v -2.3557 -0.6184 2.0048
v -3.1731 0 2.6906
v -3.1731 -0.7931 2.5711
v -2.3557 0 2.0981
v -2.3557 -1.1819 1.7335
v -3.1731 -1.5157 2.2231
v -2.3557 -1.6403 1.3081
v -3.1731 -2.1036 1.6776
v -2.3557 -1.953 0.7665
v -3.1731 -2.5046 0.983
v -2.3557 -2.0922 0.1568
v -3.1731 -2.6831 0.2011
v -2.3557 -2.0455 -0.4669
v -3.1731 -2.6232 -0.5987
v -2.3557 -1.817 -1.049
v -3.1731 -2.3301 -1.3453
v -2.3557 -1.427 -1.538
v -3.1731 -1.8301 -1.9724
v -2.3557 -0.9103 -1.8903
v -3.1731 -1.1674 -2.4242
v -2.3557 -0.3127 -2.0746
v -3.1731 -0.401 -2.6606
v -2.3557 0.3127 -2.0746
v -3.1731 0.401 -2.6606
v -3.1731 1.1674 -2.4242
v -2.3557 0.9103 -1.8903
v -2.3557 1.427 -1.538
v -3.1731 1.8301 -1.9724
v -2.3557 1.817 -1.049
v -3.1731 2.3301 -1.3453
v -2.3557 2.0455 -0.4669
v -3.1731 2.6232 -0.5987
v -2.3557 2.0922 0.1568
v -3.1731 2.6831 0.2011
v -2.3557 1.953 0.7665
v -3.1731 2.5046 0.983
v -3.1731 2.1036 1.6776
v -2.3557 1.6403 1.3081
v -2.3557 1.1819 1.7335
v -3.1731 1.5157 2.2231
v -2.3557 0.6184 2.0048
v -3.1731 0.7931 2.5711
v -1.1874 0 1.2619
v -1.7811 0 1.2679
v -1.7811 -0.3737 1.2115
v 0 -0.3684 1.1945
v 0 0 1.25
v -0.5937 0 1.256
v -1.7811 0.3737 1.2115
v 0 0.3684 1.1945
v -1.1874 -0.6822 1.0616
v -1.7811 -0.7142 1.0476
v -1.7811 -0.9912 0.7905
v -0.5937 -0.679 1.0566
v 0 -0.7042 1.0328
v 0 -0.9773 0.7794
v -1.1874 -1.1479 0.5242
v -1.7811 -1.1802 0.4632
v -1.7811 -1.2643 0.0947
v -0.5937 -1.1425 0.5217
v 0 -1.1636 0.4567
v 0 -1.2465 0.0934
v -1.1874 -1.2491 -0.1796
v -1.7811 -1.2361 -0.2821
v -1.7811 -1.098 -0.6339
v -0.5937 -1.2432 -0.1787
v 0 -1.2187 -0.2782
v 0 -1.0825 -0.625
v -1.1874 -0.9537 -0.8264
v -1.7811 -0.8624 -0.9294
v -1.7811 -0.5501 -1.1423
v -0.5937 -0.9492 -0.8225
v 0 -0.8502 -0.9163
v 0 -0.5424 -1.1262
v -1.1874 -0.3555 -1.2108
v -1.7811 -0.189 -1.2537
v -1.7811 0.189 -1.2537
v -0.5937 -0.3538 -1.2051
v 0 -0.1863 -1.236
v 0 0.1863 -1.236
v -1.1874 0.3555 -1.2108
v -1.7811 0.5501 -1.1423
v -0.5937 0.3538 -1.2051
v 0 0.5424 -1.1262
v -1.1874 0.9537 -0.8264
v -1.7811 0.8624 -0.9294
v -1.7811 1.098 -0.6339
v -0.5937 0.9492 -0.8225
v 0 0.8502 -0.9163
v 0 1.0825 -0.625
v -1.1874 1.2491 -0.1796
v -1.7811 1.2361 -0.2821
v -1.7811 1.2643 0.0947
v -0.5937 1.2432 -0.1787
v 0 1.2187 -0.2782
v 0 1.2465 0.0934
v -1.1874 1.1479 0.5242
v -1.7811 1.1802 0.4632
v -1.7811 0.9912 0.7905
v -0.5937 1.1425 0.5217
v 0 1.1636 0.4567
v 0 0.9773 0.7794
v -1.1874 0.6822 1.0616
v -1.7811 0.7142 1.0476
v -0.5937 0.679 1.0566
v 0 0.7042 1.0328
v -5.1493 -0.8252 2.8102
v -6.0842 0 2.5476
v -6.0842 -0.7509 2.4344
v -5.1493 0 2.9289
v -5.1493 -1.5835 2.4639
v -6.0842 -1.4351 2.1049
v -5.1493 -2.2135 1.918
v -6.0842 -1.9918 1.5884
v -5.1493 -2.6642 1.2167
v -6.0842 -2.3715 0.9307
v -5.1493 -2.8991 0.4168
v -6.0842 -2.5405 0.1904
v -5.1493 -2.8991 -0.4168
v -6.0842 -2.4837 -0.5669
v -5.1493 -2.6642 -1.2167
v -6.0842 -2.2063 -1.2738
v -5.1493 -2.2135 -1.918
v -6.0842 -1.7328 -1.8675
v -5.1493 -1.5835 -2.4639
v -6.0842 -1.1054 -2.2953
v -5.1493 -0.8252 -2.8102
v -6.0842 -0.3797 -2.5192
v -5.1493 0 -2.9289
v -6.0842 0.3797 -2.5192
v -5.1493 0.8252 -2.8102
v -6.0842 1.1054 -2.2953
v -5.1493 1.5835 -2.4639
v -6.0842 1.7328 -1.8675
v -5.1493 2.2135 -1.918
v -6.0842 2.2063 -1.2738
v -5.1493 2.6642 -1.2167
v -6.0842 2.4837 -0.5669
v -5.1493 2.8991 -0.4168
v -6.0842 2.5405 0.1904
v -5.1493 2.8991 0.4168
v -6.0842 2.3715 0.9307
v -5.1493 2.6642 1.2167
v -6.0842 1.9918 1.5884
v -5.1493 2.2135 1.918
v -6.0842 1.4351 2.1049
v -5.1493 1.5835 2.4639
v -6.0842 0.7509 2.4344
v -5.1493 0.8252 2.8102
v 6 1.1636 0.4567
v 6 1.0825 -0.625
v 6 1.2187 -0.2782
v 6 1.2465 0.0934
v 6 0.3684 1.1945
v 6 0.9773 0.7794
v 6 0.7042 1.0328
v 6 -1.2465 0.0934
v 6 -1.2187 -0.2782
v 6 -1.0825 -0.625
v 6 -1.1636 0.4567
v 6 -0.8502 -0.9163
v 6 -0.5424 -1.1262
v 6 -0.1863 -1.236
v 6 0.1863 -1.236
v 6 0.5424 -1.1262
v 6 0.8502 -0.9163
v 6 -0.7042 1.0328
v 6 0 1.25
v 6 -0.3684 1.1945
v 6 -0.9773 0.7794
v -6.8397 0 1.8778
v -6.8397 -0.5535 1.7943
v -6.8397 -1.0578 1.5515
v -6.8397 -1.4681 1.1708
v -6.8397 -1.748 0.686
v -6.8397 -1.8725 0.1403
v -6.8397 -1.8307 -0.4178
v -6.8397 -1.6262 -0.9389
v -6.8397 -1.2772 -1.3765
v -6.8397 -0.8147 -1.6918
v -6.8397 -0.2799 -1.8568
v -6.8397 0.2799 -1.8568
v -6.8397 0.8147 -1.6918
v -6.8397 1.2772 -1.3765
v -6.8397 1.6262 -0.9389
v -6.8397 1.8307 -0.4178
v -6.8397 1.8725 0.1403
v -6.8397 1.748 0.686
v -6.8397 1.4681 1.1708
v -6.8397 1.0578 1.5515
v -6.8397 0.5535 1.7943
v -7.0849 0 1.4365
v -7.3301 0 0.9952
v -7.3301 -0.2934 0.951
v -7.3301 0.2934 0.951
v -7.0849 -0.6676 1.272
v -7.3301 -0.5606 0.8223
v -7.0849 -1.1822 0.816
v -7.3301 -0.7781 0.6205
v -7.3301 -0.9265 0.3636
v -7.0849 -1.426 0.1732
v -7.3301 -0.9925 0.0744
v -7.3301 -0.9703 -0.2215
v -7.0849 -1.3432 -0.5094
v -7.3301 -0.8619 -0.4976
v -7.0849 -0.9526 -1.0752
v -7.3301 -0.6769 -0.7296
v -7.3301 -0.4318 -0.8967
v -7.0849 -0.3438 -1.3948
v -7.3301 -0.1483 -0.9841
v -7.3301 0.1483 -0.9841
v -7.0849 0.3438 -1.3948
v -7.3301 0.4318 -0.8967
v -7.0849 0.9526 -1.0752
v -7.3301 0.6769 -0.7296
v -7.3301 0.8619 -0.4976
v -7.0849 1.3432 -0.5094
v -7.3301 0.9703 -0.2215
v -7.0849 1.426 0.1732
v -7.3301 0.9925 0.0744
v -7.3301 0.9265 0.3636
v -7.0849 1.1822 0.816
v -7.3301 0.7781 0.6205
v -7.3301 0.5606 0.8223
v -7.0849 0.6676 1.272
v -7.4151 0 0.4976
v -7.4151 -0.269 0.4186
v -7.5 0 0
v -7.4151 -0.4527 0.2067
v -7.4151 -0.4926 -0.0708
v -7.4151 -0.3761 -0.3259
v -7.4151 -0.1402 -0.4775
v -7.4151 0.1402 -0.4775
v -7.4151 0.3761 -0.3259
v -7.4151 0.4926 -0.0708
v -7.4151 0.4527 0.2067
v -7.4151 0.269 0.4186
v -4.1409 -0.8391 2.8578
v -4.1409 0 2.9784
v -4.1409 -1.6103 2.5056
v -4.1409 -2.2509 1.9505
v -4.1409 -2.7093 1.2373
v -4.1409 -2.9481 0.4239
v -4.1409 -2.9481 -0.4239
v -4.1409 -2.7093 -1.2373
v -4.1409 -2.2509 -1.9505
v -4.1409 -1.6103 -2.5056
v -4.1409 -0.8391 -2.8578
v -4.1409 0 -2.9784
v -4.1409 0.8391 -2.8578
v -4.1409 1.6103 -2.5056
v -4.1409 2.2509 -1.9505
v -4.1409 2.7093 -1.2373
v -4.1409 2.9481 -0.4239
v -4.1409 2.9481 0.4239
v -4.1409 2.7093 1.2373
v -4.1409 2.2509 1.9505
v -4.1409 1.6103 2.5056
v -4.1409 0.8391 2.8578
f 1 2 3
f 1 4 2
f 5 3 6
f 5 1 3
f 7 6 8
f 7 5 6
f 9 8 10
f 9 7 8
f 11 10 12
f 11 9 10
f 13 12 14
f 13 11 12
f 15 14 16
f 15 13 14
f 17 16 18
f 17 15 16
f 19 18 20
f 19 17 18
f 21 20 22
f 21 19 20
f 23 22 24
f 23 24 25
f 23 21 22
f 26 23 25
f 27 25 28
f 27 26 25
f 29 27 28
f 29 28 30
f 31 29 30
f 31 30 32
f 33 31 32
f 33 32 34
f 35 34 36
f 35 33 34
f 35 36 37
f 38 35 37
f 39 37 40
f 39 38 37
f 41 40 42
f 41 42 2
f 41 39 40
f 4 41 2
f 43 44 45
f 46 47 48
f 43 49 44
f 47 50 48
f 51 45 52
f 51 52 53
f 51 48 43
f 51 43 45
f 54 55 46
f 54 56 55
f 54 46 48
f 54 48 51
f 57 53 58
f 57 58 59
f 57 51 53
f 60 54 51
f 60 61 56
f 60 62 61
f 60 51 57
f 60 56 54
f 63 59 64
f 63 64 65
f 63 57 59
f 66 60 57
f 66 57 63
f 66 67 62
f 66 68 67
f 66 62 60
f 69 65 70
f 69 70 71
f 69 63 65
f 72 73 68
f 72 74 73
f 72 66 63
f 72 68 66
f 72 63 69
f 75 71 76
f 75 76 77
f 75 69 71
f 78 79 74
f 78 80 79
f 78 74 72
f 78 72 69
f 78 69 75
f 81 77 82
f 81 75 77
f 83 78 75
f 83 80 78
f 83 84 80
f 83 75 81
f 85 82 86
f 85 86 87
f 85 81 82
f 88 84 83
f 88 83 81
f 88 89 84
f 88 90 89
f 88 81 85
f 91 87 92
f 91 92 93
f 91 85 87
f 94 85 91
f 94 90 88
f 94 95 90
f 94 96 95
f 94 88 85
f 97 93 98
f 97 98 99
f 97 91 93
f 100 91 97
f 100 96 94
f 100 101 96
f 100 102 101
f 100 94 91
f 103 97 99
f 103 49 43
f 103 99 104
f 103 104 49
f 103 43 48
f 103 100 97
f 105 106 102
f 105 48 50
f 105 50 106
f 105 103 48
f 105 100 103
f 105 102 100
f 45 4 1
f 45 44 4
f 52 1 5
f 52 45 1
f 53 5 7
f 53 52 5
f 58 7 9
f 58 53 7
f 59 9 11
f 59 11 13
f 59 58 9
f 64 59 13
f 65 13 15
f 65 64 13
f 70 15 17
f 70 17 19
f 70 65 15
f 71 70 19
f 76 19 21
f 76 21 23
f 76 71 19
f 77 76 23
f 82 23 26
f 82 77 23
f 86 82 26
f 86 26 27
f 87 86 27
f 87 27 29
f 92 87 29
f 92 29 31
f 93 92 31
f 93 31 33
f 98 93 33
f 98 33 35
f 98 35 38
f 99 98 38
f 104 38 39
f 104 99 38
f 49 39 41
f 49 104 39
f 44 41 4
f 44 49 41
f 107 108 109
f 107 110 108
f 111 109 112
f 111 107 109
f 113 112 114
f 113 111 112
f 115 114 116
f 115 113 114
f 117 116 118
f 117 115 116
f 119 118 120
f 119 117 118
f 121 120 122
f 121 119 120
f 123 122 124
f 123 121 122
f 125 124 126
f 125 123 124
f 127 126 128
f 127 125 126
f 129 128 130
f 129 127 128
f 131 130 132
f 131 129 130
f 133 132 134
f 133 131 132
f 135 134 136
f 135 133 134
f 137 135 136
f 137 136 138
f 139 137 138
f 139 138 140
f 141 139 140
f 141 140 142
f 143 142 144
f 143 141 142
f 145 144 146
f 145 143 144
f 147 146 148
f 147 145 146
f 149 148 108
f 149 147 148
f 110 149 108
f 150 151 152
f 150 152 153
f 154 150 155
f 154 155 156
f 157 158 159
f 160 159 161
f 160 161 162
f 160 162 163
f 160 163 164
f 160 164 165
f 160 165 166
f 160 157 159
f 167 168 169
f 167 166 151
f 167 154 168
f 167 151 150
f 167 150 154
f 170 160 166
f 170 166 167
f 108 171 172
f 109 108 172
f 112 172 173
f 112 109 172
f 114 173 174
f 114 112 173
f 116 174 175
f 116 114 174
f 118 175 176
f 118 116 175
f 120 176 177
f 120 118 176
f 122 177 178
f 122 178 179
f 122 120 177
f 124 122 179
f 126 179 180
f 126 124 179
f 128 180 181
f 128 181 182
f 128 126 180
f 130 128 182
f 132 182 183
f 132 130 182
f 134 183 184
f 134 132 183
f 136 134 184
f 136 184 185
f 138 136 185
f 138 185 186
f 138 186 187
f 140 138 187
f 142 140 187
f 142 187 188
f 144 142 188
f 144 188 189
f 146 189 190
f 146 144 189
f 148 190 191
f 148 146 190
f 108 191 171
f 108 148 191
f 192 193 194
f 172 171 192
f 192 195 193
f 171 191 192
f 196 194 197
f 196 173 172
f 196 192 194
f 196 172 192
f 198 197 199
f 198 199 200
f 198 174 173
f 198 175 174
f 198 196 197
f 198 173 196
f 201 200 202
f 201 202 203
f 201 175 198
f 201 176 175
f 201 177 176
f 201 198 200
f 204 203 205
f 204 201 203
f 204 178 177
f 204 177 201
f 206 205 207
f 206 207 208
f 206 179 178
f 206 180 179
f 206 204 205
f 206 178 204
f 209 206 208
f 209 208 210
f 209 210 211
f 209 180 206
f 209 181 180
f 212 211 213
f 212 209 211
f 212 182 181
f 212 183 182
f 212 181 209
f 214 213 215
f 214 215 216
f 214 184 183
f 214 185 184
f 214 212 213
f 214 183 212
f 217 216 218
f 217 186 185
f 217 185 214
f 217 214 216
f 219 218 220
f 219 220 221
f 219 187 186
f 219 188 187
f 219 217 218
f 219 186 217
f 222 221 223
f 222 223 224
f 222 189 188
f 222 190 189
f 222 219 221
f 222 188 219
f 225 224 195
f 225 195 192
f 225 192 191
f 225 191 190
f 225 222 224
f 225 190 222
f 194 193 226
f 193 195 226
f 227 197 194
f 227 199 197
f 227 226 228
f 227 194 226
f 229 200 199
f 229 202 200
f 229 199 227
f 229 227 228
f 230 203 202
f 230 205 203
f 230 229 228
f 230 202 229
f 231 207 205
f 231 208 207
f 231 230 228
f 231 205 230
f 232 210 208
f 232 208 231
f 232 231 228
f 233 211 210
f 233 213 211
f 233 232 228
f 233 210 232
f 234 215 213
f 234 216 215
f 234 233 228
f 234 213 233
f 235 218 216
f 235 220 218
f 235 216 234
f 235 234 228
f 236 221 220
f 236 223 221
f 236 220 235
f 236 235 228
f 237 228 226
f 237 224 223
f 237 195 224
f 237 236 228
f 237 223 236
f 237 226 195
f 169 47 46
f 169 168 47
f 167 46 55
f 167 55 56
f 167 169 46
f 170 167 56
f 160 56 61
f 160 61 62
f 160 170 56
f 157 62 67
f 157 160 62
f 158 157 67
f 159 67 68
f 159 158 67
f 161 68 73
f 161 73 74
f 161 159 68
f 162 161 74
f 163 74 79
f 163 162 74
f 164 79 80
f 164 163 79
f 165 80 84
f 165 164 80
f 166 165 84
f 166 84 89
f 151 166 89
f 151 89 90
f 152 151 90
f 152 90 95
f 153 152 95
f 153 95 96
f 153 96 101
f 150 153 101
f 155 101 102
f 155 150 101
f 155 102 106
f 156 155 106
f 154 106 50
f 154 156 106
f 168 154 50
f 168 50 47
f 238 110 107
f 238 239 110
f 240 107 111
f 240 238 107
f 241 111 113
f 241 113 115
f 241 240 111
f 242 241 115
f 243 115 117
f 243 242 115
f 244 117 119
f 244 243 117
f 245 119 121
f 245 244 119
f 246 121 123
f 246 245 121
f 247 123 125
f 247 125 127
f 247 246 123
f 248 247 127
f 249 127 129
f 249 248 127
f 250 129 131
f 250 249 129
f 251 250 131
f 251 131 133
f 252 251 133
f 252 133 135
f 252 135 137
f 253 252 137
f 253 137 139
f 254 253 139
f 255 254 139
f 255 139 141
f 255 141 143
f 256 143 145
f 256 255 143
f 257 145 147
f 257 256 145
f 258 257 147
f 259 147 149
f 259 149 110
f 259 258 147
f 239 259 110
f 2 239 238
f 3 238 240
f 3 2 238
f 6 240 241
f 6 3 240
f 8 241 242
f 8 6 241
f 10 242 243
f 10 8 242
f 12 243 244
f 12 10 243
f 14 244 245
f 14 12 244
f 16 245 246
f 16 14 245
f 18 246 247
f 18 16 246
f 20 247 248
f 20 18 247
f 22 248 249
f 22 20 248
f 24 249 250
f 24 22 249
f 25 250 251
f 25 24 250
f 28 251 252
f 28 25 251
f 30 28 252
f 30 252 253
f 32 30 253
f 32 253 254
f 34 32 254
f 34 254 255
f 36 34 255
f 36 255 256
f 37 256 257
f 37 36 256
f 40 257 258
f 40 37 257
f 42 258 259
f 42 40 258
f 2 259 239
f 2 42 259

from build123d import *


with BuildPart() as part:
    # Ball_Stud Sketch → Ball_Stud (revolve)
    with BuildSketch(Plane.XY):
        Polygon((-7.5, 0), (-7.330102502, 0.995248625), (-6.839653449, 1.877770417), (-6.084203552, 2.547606545), (-5.149318842, 2.928888021), (-4.140889034, 2.978429001), (-3.173133929, 2.690618225), (-2.355666308, 2.098054579), (-1.781076639, 1.267854785), (0, 1.25), (6, 1.25), (6, 0), align=None)
    revolve(axis=Axis((-1000, 0, 0), (1, 0, 0)))


solid = part.part
